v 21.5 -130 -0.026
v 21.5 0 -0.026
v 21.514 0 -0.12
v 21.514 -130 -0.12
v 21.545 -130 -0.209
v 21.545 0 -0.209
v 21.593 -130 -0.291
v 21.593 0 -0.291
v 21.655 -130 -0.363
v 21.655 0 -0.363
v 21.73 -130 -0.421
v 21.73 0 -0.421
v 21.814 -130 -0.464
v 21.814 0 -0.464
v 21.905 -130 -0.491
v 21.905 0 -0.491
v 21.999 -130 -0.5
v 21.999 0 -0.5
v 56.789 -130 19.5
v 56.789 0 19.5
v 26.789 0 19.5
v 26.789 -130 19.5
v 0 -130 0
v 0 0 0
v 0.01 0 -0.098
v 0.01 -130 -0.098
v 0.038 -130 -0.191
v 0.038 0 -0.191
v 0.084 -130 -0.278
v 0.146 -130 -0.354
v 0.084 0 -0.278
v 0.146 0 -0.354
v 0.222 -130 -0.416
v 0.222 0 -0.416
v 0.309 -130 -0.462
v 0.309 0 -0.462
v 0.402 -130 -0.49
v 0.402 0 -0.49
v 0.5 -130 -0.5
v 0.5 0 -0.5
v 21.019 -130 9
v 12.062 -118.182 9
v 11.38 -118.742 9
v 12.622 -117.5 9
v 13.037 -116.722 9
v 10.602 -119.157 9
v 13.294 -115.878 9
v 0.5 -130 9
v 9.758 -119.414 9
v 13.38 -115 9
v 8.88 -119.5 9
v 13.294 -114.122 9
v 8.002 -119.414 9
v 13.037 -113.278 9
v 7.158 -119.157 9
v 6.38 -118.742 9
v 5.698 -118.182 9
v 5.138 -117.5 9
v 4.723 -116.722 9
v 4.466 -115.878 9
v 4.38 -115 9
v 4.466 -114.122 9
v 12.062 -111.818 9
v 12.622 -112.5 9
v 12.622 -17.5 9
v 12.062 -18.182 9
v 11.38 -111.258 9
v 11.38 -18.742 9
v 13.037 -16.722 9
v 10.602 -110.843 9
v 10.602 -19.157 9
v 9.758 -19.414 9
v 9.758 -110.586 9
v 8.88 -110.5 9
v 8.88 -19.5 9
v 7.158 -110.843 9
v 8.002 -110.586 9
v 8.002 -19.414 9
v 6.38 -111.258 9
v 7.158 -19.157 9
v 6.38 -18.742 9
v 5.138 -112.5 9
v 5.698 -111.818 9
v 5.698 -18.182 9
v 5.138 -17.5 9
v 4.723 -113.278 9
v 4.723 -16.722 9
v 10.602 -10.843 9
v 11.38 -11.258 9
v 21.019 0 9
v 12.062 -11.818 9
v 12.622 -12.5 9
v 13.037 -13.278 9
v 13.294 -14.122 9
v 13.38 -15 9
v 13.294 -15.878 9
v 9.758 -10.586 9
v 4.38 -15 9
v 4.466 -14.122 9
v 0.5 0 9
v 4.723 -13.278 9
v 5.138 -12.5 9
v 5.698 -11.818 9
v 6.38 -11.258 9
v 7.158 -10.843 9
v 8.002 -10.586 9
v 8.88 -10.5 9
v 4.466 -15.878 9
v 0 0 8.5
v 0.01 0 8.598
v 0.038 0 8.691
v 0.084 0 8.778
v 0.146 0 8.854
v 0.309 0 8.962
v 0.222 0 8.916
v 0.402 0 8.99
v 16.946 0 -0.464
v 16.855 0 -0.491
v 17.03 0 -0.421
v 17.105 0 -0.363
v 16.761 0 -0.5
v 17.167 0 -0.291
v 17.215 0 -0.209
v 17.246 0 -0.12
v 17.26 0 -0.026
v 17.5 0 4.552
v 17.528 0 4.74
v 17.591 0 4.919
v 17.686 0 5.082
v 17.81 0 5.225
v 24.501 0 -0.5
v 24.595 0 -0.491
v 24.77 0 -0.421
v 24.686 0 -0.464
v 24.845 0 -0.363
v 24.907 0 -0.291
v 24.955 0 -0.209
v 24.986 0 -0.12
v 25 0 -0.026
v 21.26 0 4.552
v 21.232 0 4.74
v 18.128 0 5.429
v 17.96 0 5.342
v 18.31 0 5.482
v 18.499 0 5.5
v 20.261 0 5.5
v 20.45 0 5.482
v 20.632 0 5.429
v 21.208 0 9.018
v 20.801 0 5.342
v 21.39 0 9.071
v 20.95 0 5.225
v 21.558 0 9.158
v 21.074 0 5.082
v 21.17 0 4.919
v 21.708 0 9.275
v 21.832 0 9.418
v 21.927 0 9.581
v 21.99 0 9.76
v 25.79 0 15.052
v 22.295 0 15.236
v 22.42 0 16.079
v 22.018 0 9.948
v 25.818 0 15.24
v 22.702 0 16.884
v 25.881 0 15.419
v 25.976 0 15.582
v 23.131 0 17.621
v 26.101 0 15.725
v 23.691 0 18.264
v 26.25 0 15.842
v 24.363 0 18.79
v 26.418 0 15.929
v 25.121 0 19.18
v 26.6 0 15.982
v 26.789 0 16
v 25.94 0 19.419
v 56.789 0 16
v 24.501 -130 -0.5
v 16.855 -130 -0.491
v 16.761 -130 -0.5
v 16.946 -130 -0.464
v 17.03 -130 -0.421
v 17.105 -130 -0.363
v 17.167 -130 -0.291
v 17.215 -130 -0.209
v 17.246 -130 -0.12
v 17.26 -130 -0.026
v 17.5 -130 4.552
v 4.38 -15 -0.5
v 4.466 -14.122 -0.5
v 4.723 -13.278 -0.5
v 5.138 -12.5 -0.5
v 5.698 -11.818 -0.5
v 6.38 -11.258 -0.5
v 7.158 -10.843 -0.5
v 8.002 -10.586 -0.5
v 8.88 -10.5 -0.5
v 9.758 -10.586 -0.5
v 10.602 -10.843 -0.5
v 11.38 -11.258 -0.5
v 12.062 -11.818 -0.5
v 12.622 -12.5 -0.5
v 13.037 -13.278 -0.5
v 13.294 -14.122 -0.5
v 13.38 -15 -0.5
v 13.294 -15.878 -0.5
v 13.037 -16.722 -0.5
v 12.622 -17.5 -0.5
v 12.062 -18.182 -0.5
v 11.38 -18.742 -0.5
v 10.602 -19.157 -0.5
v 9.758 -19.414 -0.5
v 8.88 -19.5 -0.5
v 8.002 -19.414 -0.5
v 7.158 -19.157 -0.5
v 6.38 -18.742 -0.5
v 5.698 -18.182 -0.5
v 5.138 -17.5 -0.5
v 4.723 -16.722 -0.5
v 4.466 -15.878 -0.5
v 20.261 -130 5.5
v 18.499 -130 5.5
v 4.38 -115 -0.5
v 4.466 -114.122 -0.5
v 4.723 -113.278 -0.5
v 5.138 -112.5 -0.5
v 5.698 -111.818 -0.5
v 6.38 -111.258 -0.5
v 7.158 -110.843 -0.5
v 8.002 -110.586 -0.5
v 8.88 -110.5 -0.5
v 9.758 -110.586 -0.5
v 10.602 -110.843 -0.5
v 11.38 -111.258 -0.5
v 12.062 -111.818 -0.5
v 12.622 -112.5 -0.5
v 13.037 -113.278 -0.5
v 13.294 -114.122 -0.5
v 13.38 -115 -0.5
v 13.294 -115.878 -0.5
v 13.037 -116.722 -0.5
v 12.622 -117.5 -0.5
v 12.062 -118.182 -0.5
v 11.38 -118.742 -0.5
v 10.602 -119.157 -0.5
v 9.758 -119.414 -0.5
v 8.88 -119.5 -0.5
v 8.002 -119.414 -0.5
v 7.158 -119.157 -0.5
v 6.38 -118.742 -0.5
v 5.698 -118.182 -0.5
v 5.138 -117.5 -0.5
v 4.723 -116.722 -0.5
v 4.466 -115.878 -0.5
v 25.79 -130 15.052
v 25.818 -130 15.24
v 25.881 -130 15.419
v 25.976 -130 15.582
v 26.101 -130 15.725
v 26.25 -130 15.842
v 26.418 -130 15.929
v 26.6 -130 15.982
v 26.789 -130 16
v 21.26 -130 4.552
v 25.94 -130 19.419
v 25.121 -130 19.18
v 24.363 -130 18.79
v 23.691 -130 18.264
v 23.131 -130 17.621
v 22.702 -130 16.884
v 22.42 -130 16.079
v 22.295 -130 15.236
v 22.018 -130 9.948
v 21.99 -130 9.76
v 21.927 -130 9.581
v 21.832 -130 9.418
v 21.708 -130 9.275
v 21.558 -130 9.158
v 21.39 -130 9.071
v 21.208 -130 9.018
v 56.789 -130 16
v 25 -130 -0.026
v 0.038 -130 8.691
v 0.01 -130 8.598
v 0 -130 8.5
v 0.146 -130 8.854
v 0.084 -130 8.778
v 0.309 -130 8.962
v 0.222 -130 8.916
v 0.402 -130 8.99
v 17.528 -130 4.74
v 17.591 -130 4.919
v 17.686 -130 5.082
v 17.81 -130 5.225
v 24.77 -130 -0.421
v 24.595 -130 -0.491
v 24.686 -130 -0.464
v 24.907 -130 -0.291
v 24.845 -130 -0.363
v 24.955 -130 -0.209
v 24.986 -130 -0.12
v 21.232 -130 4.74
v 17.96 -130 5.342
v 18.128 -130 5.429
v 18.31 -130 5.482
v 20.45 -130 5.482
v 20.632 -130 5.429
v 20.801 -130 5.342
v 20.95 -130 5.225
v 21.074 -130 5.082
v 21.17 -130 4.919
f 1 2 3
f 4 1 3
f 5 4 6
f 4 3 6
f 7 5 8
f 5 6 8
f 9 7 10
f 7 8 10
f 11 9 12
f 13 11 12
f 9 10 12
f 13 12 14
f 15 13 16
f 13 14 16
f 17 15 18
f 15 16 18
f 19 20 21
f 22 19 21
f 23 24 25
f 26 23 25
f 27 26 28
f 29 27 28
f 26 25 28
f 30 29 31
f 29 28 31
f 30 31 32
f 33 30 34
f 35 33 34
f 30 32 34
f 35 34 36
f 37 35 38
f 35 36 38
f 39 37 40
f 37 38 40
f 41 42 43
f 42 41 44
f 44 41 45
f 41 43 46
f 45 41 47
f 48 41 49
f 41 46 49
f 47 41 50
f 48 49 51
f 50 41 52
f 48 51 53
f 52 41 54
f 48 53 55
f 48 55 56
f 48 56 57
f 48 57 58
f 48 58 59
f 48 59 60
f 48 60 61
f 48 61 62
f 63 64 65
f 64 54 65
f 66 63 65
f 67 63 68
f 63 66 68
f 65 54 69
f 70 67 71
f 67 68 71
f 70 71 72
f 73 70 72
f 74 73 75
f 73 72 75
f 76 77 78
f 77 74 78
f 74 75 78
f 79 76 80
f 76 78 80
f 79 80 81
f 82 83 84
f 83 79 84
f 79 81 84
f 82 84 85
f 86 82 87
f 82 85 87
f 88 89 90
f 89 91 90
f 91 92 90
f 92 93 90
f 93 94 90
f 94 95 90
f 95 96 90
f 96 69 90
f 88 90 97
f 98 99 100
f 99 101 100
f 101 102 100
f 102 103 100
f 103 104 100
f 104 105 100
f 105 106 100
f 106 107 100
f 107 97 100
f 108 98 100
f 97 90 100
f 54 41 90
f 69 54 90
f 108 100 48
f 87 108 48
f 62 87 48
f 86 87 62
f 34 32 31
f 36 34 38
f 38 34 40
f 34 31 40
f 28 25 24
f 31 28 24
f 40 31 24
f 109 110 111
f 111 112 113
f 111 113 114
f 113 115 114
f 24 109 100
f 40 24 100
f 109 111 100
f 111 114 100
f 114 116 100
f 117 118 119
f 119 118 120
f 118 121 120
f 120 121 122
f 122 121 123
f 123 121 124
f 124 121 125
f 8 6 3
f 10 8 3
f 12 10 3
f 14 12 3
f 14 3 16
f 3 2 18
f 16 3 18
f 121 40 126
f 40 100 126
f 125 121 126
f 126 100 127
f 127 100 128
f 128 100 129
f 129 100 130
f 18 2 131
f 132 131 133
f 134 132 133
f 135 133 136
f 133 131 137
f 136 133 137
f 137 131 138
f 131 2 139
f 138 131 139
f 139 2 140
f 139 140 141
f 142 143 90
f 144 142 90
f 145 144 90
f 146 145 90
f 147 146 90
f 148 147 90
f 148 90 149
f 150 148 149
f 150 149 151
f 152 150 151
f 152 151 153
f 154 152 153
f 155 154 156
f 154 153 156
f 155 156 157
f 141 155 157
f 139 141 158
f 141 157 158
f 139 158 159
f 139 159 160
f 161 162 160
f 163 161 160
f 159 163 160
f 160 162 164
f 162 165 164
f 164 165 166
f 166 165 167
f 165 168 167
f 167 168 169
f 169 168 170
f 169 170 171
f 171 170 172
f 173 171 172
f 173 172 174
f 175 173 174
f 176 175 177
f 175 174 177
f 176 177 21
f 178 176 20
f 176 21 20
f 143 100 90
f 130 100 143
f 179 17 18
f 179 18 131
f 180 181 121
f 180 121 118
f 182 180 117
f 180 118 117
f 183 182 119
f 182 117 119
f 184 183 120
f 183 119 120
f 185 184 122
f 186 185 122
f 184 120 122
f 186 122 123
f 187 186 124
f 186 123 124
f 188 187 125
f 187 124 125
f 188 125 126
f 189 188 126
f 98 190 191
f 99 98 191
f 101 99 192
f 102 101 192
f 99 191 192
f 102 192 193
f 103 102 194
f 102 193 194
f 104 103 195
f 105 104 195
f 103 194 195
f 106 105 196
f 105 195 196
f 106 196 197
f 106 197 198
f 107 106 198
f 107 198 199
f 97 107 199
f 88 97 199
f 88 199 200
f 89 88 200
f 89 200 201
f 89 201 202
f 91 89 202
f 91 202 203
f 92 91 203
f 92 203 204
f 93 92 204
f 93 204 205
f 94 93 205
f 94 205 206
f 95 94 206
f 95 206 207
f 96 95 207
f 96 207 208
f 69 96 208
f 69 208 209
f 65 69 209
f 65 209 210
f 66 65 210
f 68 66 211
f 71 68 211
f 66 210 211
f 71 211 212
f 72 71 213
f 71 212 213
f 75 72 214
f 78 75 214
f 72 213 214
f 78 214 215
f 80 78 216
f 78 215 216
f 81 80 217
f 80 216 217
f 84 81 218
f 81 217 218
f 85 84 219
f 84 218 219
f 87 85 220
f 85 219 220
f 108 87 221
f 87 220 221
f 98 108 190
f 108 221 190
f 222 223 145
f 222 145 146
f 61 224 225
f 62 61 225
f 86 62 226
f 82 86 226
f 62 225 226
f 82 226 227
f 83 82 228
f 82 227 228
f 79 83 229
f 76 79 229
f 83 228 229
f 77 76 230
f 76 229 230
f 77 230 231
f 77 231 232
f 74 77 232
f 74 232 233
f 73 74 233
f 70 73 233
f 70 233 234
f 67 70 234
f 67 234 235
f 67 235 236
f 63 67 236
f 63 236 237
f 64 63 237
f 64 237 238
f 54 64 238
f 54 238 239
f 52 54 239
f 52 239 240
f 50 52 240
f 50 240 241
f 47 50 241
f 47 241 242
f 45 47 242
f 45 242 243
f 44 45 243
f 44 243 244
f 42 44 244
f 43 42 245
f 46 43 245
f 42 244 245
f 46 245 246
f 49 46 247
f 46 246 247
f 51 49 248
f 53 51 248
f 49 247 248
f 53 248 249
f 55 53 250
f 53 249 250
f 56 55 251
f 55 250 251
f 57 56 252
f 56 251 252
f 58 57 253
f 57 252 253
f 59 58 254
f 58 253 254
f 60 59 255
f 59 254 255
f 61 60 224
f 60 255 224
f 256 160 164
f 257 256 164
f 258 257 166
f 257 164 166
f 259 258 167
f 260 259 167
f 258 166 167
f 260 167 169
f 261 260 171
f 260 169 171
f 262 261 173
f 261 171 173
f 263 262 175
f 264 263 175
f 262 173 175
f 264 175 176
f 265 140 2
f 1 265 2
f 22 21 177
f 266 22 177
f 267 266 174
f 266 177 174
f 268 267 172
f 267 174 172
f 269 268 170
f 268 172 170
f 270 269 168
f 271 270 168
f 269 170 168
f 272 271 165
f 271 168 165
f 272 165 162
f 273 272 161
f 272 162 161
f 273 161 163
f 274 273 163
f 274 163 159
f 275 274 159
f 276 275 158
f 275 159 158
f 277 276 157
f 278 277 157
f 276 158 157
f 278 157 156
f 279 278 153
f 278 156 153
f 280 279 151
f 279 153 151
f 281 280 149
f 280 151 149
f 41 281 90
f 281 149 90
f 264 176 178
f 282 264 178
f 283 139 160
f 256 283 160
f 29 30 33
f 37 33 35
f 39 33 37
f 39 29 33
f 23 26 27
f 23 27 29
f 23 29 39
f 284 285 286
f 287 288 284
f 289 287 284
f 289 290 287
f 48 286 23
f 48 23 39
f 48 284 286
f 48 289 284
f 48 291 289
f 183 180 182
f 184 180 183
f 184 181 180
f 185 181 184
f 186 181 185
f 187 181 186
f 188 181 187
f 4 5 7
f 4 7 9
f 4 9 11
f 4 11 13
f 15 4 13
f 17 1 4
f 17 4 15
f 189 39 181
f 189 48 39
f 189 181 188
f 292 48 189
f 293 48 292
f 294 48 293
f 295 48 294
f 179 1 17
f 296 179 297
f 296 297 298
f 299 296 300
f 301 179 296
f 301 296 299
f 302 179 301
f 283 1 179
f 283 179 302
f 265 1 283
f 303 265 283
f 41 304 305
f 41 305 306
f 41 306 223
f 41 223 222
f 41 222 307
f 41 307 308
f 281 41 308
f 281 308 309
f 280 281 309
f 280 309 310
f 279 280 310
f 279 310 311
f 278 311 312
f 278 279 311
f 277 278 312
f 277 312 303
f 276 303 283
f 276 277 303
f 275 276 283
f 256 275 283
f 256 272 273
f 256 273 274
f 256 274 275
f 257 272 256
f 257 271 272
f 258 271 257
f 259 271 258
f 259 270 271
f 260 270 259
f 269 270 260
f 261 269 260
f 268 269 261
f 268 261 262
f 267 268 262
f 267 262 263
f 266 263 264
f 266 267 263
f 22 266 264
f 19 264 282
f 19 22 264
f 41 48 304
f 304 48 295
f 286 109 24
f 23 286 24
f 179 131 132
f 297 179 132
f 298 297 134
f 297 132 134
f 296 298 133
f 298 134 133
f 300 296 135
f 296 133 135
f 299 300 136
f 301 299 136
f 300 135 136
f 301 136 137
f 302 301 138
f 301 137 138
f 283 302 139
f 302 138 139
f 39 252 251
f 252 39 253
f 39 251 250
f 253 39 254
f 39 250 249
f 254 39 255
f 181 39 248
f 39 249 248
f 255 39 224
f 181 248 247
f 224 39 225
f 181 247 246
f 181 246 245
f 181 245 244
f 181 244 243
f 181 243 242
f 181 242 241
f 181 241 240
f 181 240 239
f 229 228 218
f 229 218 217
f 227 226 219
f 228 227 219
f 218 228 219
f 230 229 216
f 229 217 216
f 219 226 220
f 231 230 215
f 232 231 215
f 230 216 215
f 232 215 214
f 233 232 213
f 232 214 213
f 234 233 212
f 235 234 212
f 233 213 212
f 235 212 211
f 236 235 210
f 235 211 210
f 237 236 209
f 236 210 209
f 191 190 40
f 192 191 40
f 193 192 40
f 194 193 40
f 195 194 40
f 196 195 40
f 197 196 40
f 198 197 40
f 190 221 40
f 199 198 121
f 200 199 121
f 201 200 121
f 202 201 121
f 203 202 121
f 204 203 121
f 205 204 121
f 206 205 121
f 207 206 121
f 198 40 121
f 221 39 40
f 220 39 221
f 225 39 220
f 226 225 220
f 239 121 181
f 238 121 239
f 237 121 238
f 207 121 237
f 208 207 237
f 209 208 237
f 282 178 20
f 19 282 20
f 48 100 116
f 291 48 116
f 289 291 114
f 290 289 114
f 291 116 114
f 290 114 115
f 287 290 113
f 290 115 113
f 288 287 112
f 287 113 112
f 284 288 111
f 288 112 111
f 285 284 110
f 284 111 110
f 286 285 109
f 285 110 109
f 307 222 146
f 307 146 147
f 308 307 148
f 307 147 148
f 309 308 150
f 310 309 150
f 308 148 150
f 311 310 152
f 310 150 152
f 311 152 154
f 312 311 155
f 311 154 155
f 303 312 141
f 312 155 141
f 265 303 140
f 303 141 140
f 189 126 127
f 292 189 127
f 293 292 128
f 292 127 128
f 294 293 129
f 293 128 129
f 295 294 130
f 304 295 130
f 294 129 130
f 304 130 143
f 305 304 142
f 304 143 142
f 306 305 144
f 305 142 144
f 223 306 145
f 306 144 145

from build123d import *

# Parameters (mm, degrees)
F1_DEPTH = 130
F3_D     = 9
F4_D     = 9


with BuildPart() as f1:
    # F0 (on Front) → F1 (new body)
    with BuildSketch(Plane.XZ):
        with BuildLine():
            Line((0, 8.5), (0, 0))
            ThreePointArc((0, 0), (0.146447, -0.353553), (0.5, -0.5))
            Line((0.5, -0.5), (16.760787, -0.5))
            ThreePointArc((16.760787, -0.5), (17.104964, -0.362687), (17.260102, -0.026168))
            Line((17.260102, -0.026168), (17.500051, 4.552336))
            ThreePointArc((17.500051, 4.552336), (17.810326, 5.225374), (18.49868, 5.5))
            Line((18.49868, 5.5), (20.261421, 5.5))
            ThreePointArc((20.261421, 5.5), (20.949776, 5.225374), (21.260051, 4.552336))
            Line((21.260051, 4.552336), (21.5, -0.026168))
            ThreePointArc((21.5, -0.026168), (21.655137, -0.362687), (21.999315, -0.5))
            Line((21.999315, -0.5), (24.500685, -0.5))
            ThreePointArc((24.500685, -0.5), (24.844863, -0.362687), (25, -0.026168))
            Line((25, -0.026168), (25.790231, 15.052336))
            ThreePointArc((25.790231, 15.052336), (26.100506, 15.725374), (26.78886, 16))
            Line((26.78886, 16), (56.78886, 16))
            Line((56.78886, 16), (56.78886, 19.5))
            Line((56.78886, 19.5), (26.78886, 19.5))
            ThreePointArc((26.78886, 19.5), (23.691265, 18.264185), (22.295028, 15.235512))
            Line((22.295028, 15.235512), (22.017903, 9.947664))
            ThreePointArc((22.017903, 9.947664), (21.707628, 9.274626), (21.019274, 9))
            Line((21.019274, 9), (0.5, 9))
            ThreePointArc((0.5, 9), (0.146447, 8.853553), (0, 8.5))
        make_face()
    extrude(amount=F1_DEPTH)

    # F3 (through all)
    with Locations(Plane.XY.offset(9)):
        with Locations((8.88, -15)):
            Hole(F3_D / 2)

    # F4 (through all)
    with Locations(Plane.XY.offset(9)):
        with Locations((8.88, -115)):
            Hole(F4_D / 2)


solid = f1.part
